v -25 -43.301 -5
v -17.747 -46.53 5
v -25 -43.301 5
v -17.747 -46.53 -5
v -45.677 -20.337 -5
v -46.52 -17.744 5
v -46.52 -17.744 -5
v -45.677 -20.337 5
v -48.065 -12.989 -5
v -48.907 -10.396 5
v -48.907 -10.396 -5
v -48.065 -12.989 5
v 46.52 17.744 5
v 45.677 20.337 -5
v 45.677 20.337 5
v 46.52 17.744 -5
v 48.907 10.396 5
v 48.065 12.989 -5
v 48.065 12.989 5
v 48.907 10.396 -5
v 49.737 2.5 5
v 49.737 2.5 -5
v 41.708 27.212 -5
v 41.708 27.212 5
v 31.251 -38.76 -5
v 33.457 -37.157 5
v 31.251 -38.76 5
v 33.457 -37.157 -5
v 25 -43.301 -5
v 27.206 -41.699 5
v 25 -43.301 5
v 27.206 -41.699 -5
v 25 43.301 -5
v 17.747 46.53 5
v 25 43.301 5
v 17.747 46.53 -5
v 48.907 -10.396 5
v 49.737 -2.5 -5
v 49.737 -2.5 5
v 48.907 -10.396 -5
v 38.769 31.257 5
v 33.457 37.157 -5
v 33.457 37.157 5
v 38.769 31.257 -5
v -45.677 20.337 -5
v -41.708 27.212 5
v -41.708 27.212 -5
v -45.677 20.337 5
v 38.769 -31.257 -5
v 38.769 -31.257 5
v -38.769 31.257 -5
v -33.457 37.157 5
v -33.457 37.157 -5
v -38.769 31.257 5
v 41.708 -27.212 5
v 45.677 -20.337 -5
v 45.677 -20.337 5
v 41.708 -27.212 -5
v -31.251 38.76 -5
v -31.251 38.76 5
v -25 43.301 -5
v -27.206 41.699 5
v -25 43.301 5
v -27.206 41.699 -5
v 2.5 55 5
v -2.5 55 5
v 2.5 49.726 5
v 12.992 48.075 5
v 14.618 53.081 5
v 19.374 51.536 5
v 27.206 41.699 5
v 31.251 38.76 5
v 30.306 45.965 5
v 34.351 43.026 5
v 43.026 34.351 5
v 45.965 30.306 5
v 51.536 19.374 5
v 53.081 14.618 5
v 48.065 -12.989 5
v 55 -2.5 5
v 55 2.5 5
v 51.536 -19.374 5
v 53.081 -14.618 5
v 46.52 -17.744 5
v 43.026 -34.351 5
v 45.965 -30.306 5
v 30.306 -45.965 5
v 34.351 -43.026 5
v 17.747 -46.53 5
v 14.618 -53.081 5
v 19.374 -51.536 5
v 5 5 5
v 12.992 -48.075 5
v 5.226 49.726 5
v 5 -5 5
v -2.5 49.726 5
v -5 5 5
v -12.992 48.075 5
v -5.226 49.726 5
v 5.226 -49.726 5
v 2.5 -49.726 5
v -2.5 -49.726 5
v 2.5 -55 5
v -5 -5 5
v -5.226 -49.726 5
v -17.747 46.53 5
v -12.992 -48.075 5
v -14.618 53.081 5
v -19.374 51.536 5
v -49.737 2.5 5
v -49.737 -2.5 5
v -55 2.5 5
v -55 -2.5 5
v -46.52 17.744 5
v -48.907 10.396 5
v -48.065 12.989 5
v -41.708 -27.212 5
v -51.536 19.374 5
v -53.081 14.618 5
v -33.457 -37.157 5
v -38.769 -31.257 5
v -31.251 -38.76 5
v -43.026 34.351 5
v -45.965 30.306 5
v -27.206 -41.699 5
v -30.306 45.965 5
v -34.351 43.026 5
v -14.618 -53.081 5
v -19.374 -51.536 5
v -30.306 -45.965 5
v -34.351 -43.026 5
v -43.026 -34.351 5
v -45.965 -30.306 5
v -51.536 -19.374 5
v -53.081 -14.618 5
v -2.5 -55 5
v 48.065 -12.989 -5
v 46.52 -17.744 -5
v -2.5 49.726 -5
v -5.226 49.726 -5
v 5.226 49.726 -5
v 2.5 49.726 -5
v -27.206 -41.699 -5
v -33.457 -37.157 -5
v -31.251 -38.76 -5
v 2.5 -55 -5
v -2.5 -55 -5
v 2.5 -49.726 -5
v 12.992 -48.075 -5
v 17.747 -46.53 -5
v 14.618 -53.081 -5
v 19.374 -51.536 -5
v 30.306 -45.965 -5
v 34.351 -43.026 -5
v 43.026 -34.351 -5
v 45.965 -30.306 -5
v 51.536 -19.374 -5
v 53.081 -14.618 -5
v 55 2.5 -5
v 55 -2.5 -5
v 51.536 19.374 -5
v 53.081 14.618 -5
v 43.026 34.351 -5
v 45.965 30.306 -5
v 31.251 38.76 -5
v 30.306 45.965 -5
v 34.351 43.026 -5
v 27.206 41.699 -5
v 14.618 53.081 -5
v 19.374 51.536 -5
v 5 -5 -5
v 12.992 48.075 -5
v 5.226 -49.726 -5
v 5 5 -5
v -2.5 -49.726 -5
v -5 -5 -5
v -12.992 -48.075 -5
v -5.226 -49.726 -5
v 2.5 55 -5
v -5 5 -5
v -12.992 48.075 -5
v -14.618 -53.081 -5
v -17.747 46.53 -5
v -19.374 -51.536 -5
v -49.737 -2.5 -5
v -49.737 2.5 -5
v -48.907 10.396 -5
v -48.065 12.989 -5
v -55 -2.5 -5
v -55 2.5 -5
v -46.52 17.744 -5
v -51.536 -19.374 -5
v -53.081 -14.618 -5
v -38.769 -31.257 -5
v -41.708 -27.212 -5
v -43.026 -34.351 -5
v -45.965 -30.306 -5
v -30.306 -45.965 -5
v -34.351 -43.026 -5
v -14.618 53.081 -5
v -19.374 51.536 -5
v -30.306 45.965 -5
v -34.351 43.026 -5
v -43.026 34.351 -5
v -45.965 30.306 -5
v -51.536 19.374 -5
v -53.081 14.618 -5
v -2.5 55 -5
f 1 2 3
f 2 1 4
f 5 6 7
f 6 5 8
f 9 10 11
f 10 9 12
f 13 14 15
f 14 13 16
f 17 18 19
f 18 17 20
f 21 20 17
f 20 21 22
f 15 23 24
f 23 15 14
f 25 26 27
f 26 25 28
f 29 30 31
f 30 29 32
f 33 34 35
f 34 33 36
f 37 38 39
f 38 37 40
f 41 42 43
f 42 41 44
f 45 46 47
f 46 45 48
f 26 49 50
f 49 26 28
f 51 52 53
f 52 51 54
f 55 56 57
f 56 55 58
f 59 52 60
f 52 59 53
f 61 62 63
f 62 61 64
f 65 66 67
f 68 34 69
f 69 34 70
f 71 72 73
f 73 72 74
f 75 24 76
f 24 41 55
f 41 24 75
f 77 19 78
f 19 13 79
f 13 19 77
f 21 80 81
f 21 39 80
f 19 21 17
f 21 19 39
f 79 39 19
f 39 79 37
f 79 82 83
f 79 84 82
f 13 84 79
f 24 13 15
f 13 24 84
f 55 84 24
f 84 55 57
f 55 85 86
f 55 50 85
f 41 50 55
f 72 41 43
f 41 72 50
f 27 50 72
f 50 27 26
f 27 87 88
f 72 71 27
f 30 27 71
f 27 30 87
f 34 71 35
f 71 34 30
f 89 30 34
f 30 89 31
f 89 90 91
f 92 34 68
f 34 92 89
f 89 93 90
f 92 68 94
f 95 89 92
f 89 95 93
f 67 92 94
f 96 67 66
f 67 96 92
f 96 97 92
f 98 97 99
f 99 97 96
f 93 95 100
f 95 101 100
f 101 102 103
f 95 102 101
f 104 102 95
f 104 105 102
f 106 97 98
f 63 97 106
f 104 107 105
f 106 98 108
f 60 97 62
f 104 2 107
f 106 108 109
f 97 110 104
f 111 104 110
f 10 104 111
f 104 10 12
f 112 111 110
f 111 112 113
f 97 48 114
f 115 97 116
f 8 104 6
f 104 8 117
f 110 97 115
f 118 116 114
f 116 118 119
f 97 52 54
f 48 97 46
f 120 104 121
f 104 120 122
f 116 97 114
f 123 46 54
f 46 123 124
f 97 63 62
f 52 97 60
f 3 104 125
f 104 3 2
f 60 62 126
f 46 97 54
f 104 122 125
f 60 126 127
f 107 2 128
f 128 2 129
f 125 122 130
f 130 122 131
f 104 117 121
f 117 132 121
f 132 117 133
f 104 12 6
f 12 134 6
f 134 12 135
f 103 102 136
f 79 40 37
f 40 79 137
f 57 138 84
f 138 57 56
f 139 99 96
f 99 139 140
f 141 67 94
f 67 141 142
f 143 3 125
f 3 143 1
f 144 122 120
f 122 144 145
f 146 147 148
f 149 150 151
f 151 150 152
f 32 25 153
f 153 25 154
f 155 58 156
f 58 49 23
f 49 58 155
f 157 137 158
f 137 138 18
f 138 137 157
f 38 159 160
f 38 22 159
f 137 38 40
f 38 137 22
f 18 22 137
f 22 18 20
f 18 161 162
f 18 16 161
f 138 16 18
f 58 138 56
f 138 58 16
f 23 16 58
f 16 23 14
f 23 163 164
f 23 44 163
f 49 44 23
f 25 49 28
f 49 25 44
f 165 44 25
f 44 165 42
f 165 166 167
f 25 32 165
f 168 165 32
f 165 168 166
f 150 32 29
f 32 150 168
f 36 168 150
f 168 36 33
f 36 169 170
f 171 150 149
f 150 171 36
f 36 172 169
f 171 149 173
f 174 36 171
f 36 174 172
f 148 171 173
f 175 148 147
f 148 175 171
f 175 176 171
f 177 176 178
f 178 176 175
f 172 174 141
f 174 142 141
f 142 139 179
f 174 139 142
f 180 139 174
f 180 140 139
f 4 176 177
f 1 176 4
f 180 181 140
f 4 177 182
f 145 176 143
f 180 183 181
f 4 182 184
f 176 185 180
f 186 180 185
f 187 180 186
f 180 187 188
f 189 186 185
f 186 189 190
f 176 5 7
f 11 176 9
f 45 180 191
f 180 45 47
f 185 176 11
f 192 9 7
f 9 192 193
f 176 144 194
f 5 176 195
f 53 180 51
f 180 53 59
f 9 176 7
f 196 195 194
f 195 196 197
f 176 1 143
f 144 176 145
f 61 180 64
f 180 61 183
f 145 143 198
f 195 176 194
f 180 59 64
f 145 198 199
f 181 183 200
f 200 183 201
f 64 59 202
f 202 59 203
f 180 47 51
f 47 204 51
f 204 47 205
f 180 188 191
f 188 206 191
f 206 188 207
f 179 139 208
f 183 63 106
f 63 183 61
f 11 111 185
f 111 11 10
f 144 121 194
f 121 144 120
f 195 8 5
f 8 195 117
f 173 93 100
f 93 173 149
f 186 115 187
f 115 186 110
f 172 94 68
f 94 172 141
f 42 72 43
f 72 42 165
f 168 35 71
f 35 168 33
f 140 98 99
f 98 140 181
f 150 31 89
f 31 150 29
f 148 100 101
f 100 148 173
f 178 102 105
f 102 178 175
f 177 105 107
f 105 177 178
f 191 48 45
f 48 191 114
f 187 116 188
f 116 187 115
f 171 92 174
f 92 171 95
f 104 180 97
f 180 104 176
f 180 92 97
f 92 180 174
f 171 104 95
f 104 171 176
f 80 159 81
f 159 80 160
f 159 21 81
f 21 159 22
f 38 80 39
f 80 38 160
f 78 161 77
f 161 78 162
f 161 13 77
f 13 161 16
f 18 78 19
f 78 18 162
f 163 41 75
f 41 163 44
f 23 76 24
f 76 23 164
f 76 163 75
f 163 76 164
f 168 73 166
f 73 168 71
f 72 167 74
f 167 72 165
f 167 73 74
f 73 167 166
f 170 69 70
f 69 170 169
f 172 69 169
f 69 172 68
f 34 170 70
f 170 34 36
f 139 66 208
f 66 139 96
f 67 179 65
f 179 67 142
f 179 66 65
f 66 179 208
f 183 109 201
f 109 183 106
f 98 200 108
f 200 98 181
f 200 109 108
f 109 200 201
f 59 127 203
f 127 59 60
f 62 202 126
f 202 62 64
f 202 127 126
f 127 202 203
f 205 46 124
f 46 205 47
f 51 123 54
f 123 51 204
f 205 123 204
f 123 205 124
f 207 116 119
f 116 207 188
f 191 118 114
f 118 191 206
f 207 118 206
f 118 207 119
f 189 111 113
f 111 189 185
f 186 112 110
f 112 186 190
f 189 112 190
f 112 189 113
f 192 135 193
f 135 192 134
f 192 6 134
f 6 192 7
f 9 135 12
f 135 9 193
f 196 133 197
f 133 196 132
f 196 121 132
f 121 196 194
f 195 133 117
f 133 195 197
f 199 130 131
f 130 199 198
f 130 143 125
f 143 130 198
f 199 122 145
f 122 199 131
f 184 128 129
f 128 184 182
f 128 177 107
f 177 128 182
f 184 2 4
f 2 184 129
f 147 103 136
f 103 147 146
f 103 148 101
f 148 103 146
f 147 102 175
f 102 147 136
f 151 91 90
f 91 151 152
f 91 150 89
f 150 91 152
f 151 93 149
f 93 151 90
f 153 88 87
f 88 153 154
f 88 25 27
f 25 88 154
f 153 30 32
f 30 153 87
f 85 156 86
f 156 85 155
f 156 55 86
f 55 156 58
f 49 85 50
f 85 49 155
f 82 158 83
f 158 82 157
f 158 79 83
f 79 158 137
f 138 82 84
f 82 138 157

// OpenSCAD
/**
 * Parametric gear
 * Model jednoduchého ozubeného kola
 * Zuby je pro uznání nutné dělat forcykly!
 * @param gear_rad Poloměr ozubeného kola
 * @param gear_thickness Tloušťka kola
 * @param center_hole_width Šířka čtverce uprostřed kola
 * @param tooth_width Šířka jednoho zubu
 * @param tooth_prot Výstup zubu (jak moc je vystouplý zub)
 * @param tooth_count Počet zubů na ozubeném kolu po obvodu
 * @author Marek Žehra
 */

module gear(
  gear_rad=50,
  gear_thickness=10,
  center_hole_width=10,
  tooth_width=5,
  tooth_prot=5,
  tooth_count=20
) {
  //= Kolo s prostrednim vyrezem
  difference() {
    cylinder( r=gear_rad, h=gear_thickness, center=true ); 
    cube( size=[center_hole_width, center_hole_width, gear_thickness], center=true );
  }
  
  //= Cyklus pro zuby
  for( i=[0:(tooth_count-1)] ) {
    rotate( [0,0, i*360/tooth_count] ) translate( [gear_rad, 0, 0 ] ) cube( [2*tooth_prot, tooth_width, gear_thickness], center=true );
  }
}

gear();
